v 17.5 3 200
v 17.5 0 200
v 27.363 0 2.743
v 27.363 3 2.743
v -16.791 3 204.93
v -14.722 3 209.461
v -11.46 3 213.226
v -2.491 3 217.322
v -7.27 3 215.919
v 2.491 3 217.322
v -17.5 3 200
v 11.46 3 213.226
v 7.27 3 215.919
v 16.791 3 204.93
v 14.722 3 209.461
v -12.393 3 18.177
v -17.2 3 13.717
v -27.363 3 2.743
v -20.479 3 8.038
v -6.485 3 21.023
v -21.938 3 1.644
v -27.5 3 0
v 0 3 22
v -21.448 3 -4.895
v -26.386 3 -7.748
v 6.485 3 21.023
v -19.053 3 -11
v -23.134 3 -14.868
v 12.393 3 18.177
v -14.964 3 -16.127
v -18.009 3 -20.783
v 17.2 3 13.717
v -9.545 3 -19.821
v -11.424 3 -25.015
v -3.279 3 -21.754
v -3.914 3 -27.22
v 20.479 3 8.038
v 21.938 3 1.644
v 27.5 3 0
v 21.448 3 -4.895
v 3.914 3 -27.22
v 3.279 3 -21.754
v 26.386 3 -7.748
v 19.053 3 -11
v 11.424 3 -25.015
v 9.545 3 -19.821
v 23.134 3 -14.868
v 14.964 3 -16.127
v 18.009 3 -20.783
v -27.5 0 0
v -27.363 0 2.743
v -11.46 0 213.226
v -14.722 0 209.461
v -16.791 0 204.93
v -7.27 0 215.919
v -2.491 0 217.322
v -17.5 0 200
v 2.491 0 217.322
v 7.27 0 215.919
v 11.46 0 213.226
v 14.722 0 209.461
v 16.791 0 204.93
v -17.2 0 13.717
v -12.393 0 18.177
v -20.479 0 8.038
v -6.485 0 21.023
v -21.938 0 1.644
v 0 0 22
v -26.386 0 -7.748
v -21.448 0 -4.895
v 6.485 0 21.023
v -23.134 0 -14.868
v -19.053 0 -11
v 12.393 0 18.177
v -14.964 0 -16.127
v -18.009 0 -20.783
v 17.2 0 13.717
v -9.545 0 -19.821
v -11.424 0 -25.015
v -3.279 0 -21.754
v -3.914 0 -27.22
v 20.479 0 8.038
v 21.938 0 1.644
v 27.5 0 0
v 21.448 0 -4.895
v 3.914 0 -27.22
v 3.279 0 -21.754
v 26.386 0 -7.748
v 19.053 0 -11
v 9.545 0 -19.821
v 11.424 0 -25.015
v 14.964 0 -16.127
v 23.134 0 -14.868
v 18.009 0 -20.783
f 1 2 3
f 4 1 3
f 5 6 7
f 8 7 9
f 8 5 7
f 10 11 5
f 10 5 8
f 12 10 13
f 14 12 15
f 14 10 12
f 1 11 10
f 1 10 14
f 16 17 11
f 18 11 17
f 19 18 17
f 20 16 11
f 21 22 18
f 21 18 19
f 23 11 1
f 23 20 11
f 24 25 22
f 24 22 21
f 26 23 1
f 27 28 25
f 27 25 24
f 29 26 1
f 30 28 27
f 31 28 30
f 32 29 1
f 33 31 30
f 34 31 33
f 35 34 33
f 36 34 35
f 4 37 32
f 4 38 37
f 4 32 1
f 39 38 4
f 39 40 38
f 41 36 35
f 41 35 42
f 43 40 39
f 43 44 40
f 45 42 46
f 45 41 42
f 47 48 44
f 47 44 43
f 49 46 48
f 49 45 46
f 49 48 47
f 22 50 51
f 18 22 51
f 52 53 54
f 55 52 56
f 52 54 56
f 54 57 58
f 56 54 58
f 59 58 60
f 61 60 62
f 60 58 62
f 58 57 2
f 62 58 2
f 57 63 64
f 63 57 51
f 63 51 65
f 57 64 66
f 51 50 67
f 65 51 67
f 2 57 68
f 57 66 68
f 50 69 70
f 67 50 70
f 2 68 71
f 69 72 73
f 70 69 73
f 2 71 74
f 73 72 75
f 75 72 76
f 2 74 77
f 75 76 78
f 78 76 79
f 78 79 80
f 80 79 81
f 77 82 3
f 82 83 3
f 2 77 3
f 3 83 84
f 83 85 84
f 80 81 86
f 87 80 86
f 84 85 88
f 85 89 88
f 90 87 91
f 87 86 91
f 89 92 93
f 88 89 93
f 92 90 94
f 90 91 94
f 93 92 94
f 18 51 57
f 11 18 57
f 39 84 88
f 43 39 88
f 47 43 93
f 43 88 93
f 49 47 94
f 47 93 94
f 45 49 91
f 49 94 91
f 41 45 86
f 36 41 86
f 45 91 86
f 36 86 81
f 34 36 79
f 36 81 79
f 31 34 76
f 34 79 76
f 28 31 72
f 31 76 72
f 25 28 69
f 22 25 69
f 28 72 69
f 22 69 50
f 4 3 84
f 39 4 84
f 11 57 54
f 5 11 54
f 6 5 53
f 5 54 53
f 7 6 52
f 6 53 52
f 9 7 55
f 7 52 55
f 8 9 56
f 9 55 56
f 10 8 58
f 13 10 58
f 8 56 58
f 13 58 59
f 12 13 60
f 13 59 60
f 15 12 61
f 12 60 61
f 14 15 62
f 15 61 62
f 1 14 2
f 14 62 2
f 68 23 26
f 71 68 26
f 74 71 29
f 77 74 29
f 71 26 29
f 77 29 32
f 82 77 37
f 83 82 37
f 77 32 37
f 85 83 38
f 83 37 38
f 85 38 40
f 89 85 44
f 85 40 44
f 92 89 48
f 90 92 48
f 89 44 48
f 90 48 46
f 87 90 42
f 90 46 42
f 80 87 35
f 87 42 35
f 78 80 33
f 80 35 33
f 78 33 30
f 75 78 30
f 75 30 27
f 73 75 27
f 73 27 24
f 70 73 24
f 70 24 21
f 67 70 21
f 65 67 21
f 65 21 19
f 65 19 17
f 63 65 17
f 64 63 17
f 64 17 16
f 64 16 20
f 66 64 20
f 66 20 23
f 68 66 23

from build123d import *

# Parameters (mm, degrees)
SKETCH1_R           = 17.5
BOSS_EXTRUDE1_DEPTH = 3
SKETCH2_R           = 22
CUT_EXTRUDE1_DEPTH  = 220.25213796


with BuildPart() as part:
    # Sketch1 → Boss-Extrude1 (new body)
    with BuildSketch(Plane(origin=(0, 0, 0), x_dir=(1, 0, 0), z_dir=(0, 1, 0))):
        with BuildLine():
            ThreePointArc((27.5, 0), (0, 27.5), (-27.5, 0))
            Line((-27.5, 0), (-27.362842893, -2.743142145))
            ThreePointArc((-27.362842893, -2.743142145), (0, -27.5), (27.362842893, -2.743142145))
            Line((27.362842893, -2.743142145), (27.5, 0))
        make_face()
        with BuildLine():
            ThreePointArc((27.362842893, -2.743142145), (0, -27.5), (-27.362842893, -2.743142145))
            Line((-27.362842893, -2.743142145), (-17.5, -200))
            ThreePointArc((-17.5, -200), (0, -182.5), (17.5, -200))
            Line((17.5, -200), (27.362842893, -2.743142145))
        make_face()
        with Locations((0, -200)):
            Circle(SKETCH1_R)
    extrude(amount=BOSS_EXTRUDE1_DEPTH)

    # Sketch2 → Cut-Extrude1 (cut, through all)
    with BuildSketch(Plane(origin=(0, 3, 0), x_dir=(1, 0, 0), z_dir=(0, 1, 0))):
        with Locations(Location((0, 0, 0), (0, 0, 270))):
            Circle(SKETCH2_R)
    extrude(amount=-CUT_EXTRUDE1_DEPTH, mode=Mode.SUBTRACT)


solid = part.part
